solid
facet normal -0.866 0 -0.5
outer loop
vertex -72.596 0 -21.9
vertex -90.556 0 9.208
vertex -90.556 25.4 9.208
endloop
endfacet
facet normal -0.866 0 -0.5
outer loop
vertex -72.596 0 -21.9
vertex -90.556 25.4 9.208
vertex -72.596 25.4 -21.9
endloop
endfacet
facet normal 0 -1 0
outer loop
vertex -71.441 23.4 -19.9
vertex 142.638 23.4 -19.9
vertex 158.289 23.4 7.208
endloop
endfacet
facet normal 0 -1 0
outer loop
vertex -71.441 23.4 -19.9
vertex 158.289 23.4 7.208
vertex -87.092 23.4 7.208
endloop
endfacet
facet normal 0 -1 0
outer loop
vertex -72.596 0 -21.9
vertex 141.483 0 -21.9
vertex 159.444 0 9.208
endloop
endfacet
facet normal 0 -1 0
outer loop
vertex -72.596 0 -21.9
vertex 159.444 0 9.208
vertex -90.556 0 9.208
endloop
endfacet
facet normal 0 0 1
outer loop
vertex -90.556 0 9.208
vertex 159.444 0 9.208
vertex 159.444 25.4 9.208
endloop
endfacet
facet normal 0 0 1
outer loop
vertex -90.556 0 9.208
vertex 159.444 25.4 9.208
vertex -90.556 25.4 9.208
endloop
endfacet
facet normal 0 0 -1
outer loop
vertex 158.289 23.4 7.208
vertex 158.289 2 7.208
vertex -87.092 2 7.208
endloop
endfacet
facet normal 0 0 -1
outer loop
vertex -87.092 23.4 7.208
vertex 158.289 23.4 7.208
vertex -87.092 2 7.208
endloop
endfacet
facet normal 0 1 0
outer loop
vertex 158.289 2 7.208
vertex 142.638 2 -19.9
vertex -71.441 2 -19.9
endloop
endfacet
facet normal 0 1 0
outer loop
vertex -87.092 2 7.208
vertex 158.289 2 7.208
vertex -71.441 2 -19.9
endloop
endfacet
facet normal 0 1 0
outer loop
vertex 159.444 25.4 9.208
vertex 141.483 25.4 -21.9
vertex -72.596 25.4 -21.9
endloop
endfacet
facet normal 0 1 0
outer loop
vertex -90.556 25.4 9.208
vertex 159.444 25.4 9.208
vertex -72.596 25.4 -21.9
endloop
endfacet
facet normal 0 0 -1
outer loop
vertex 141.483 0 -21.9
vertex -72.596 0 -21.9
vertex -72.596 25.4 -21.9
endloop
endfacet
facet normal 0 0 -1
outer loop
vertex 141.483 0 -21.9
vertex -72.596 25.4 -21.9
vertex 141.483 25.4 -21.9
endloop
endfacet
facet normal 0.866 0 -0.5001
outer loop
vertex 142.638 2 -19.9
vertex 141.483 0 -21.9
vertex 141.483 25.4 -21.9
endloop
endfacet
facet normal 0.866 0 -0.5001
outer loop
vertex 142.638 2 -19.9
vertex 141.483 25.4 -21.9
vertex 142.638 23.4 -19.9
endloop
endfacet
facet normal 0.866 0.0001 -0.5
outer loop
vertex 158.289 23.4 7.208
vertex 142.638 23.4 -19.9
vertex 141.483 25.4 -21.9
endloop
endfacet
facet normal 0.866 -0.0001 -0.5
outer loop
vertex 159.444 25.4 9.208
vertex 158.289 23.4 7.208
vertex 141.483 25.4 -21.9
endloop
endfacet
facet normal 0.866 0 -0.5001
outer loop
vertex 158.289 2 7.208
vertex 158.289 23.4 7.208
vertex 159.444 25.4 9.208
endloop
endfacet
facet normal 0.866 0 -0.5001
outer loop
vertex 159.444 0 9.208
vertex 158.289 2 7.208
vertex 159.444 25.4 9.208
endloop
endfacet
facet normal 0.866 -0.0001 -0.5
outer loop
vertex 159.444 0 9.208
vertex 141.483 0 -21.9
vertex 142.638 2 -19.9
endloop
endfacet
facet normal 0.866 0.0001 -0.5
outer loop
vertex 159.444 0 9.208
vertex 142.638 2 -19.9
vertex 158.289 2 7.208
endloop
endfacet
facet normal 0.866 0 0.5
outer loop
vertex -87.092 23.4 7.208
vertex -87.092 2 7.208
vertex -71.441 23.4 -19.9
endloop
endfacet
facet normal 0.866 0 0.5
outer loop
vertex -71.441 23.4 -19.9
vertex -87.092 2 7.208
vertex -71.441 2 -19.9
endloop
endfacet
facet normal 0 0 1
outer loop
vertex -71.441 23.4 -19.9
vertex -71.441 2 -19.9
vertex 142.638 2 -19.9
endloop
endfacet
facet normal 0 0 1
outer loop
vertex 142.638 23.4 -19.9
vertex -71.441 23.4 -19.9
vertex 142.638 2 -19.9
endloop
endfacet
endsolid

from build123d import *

# Parameters (mm, degrees)
BOSS_EXTRUDE1_DEPTH = 25.4
SHELL3_T            = -2


with BuildPart() as part:
    # Sketch1 → Boss-Extrude1 (new body)
    with BuildSketch(Plane(origin=(0, 0, 0), x_dir=(1, 0, 0), z_dir=(0, 1, 0))):
        Polygon((-90.556063278, -9.208067905), (-72.595551035, 21.900451829), (141.48342448, 21.900451829), (159.443936722, -9.208067905), align=None)
    extrude(amount=BOSS_EXTRUDE1_DEPTH)

    # Shell3
    shell3_openings = [part.faces().sort_by_distance(p)[0] for p in [
        (150.463680601, 12.7, -6.346191962),
    ]]
    offset(amount=SHELL3_T, openings=shell3_openings, kind=Kind.INTERSECTION)


solid = part.part
